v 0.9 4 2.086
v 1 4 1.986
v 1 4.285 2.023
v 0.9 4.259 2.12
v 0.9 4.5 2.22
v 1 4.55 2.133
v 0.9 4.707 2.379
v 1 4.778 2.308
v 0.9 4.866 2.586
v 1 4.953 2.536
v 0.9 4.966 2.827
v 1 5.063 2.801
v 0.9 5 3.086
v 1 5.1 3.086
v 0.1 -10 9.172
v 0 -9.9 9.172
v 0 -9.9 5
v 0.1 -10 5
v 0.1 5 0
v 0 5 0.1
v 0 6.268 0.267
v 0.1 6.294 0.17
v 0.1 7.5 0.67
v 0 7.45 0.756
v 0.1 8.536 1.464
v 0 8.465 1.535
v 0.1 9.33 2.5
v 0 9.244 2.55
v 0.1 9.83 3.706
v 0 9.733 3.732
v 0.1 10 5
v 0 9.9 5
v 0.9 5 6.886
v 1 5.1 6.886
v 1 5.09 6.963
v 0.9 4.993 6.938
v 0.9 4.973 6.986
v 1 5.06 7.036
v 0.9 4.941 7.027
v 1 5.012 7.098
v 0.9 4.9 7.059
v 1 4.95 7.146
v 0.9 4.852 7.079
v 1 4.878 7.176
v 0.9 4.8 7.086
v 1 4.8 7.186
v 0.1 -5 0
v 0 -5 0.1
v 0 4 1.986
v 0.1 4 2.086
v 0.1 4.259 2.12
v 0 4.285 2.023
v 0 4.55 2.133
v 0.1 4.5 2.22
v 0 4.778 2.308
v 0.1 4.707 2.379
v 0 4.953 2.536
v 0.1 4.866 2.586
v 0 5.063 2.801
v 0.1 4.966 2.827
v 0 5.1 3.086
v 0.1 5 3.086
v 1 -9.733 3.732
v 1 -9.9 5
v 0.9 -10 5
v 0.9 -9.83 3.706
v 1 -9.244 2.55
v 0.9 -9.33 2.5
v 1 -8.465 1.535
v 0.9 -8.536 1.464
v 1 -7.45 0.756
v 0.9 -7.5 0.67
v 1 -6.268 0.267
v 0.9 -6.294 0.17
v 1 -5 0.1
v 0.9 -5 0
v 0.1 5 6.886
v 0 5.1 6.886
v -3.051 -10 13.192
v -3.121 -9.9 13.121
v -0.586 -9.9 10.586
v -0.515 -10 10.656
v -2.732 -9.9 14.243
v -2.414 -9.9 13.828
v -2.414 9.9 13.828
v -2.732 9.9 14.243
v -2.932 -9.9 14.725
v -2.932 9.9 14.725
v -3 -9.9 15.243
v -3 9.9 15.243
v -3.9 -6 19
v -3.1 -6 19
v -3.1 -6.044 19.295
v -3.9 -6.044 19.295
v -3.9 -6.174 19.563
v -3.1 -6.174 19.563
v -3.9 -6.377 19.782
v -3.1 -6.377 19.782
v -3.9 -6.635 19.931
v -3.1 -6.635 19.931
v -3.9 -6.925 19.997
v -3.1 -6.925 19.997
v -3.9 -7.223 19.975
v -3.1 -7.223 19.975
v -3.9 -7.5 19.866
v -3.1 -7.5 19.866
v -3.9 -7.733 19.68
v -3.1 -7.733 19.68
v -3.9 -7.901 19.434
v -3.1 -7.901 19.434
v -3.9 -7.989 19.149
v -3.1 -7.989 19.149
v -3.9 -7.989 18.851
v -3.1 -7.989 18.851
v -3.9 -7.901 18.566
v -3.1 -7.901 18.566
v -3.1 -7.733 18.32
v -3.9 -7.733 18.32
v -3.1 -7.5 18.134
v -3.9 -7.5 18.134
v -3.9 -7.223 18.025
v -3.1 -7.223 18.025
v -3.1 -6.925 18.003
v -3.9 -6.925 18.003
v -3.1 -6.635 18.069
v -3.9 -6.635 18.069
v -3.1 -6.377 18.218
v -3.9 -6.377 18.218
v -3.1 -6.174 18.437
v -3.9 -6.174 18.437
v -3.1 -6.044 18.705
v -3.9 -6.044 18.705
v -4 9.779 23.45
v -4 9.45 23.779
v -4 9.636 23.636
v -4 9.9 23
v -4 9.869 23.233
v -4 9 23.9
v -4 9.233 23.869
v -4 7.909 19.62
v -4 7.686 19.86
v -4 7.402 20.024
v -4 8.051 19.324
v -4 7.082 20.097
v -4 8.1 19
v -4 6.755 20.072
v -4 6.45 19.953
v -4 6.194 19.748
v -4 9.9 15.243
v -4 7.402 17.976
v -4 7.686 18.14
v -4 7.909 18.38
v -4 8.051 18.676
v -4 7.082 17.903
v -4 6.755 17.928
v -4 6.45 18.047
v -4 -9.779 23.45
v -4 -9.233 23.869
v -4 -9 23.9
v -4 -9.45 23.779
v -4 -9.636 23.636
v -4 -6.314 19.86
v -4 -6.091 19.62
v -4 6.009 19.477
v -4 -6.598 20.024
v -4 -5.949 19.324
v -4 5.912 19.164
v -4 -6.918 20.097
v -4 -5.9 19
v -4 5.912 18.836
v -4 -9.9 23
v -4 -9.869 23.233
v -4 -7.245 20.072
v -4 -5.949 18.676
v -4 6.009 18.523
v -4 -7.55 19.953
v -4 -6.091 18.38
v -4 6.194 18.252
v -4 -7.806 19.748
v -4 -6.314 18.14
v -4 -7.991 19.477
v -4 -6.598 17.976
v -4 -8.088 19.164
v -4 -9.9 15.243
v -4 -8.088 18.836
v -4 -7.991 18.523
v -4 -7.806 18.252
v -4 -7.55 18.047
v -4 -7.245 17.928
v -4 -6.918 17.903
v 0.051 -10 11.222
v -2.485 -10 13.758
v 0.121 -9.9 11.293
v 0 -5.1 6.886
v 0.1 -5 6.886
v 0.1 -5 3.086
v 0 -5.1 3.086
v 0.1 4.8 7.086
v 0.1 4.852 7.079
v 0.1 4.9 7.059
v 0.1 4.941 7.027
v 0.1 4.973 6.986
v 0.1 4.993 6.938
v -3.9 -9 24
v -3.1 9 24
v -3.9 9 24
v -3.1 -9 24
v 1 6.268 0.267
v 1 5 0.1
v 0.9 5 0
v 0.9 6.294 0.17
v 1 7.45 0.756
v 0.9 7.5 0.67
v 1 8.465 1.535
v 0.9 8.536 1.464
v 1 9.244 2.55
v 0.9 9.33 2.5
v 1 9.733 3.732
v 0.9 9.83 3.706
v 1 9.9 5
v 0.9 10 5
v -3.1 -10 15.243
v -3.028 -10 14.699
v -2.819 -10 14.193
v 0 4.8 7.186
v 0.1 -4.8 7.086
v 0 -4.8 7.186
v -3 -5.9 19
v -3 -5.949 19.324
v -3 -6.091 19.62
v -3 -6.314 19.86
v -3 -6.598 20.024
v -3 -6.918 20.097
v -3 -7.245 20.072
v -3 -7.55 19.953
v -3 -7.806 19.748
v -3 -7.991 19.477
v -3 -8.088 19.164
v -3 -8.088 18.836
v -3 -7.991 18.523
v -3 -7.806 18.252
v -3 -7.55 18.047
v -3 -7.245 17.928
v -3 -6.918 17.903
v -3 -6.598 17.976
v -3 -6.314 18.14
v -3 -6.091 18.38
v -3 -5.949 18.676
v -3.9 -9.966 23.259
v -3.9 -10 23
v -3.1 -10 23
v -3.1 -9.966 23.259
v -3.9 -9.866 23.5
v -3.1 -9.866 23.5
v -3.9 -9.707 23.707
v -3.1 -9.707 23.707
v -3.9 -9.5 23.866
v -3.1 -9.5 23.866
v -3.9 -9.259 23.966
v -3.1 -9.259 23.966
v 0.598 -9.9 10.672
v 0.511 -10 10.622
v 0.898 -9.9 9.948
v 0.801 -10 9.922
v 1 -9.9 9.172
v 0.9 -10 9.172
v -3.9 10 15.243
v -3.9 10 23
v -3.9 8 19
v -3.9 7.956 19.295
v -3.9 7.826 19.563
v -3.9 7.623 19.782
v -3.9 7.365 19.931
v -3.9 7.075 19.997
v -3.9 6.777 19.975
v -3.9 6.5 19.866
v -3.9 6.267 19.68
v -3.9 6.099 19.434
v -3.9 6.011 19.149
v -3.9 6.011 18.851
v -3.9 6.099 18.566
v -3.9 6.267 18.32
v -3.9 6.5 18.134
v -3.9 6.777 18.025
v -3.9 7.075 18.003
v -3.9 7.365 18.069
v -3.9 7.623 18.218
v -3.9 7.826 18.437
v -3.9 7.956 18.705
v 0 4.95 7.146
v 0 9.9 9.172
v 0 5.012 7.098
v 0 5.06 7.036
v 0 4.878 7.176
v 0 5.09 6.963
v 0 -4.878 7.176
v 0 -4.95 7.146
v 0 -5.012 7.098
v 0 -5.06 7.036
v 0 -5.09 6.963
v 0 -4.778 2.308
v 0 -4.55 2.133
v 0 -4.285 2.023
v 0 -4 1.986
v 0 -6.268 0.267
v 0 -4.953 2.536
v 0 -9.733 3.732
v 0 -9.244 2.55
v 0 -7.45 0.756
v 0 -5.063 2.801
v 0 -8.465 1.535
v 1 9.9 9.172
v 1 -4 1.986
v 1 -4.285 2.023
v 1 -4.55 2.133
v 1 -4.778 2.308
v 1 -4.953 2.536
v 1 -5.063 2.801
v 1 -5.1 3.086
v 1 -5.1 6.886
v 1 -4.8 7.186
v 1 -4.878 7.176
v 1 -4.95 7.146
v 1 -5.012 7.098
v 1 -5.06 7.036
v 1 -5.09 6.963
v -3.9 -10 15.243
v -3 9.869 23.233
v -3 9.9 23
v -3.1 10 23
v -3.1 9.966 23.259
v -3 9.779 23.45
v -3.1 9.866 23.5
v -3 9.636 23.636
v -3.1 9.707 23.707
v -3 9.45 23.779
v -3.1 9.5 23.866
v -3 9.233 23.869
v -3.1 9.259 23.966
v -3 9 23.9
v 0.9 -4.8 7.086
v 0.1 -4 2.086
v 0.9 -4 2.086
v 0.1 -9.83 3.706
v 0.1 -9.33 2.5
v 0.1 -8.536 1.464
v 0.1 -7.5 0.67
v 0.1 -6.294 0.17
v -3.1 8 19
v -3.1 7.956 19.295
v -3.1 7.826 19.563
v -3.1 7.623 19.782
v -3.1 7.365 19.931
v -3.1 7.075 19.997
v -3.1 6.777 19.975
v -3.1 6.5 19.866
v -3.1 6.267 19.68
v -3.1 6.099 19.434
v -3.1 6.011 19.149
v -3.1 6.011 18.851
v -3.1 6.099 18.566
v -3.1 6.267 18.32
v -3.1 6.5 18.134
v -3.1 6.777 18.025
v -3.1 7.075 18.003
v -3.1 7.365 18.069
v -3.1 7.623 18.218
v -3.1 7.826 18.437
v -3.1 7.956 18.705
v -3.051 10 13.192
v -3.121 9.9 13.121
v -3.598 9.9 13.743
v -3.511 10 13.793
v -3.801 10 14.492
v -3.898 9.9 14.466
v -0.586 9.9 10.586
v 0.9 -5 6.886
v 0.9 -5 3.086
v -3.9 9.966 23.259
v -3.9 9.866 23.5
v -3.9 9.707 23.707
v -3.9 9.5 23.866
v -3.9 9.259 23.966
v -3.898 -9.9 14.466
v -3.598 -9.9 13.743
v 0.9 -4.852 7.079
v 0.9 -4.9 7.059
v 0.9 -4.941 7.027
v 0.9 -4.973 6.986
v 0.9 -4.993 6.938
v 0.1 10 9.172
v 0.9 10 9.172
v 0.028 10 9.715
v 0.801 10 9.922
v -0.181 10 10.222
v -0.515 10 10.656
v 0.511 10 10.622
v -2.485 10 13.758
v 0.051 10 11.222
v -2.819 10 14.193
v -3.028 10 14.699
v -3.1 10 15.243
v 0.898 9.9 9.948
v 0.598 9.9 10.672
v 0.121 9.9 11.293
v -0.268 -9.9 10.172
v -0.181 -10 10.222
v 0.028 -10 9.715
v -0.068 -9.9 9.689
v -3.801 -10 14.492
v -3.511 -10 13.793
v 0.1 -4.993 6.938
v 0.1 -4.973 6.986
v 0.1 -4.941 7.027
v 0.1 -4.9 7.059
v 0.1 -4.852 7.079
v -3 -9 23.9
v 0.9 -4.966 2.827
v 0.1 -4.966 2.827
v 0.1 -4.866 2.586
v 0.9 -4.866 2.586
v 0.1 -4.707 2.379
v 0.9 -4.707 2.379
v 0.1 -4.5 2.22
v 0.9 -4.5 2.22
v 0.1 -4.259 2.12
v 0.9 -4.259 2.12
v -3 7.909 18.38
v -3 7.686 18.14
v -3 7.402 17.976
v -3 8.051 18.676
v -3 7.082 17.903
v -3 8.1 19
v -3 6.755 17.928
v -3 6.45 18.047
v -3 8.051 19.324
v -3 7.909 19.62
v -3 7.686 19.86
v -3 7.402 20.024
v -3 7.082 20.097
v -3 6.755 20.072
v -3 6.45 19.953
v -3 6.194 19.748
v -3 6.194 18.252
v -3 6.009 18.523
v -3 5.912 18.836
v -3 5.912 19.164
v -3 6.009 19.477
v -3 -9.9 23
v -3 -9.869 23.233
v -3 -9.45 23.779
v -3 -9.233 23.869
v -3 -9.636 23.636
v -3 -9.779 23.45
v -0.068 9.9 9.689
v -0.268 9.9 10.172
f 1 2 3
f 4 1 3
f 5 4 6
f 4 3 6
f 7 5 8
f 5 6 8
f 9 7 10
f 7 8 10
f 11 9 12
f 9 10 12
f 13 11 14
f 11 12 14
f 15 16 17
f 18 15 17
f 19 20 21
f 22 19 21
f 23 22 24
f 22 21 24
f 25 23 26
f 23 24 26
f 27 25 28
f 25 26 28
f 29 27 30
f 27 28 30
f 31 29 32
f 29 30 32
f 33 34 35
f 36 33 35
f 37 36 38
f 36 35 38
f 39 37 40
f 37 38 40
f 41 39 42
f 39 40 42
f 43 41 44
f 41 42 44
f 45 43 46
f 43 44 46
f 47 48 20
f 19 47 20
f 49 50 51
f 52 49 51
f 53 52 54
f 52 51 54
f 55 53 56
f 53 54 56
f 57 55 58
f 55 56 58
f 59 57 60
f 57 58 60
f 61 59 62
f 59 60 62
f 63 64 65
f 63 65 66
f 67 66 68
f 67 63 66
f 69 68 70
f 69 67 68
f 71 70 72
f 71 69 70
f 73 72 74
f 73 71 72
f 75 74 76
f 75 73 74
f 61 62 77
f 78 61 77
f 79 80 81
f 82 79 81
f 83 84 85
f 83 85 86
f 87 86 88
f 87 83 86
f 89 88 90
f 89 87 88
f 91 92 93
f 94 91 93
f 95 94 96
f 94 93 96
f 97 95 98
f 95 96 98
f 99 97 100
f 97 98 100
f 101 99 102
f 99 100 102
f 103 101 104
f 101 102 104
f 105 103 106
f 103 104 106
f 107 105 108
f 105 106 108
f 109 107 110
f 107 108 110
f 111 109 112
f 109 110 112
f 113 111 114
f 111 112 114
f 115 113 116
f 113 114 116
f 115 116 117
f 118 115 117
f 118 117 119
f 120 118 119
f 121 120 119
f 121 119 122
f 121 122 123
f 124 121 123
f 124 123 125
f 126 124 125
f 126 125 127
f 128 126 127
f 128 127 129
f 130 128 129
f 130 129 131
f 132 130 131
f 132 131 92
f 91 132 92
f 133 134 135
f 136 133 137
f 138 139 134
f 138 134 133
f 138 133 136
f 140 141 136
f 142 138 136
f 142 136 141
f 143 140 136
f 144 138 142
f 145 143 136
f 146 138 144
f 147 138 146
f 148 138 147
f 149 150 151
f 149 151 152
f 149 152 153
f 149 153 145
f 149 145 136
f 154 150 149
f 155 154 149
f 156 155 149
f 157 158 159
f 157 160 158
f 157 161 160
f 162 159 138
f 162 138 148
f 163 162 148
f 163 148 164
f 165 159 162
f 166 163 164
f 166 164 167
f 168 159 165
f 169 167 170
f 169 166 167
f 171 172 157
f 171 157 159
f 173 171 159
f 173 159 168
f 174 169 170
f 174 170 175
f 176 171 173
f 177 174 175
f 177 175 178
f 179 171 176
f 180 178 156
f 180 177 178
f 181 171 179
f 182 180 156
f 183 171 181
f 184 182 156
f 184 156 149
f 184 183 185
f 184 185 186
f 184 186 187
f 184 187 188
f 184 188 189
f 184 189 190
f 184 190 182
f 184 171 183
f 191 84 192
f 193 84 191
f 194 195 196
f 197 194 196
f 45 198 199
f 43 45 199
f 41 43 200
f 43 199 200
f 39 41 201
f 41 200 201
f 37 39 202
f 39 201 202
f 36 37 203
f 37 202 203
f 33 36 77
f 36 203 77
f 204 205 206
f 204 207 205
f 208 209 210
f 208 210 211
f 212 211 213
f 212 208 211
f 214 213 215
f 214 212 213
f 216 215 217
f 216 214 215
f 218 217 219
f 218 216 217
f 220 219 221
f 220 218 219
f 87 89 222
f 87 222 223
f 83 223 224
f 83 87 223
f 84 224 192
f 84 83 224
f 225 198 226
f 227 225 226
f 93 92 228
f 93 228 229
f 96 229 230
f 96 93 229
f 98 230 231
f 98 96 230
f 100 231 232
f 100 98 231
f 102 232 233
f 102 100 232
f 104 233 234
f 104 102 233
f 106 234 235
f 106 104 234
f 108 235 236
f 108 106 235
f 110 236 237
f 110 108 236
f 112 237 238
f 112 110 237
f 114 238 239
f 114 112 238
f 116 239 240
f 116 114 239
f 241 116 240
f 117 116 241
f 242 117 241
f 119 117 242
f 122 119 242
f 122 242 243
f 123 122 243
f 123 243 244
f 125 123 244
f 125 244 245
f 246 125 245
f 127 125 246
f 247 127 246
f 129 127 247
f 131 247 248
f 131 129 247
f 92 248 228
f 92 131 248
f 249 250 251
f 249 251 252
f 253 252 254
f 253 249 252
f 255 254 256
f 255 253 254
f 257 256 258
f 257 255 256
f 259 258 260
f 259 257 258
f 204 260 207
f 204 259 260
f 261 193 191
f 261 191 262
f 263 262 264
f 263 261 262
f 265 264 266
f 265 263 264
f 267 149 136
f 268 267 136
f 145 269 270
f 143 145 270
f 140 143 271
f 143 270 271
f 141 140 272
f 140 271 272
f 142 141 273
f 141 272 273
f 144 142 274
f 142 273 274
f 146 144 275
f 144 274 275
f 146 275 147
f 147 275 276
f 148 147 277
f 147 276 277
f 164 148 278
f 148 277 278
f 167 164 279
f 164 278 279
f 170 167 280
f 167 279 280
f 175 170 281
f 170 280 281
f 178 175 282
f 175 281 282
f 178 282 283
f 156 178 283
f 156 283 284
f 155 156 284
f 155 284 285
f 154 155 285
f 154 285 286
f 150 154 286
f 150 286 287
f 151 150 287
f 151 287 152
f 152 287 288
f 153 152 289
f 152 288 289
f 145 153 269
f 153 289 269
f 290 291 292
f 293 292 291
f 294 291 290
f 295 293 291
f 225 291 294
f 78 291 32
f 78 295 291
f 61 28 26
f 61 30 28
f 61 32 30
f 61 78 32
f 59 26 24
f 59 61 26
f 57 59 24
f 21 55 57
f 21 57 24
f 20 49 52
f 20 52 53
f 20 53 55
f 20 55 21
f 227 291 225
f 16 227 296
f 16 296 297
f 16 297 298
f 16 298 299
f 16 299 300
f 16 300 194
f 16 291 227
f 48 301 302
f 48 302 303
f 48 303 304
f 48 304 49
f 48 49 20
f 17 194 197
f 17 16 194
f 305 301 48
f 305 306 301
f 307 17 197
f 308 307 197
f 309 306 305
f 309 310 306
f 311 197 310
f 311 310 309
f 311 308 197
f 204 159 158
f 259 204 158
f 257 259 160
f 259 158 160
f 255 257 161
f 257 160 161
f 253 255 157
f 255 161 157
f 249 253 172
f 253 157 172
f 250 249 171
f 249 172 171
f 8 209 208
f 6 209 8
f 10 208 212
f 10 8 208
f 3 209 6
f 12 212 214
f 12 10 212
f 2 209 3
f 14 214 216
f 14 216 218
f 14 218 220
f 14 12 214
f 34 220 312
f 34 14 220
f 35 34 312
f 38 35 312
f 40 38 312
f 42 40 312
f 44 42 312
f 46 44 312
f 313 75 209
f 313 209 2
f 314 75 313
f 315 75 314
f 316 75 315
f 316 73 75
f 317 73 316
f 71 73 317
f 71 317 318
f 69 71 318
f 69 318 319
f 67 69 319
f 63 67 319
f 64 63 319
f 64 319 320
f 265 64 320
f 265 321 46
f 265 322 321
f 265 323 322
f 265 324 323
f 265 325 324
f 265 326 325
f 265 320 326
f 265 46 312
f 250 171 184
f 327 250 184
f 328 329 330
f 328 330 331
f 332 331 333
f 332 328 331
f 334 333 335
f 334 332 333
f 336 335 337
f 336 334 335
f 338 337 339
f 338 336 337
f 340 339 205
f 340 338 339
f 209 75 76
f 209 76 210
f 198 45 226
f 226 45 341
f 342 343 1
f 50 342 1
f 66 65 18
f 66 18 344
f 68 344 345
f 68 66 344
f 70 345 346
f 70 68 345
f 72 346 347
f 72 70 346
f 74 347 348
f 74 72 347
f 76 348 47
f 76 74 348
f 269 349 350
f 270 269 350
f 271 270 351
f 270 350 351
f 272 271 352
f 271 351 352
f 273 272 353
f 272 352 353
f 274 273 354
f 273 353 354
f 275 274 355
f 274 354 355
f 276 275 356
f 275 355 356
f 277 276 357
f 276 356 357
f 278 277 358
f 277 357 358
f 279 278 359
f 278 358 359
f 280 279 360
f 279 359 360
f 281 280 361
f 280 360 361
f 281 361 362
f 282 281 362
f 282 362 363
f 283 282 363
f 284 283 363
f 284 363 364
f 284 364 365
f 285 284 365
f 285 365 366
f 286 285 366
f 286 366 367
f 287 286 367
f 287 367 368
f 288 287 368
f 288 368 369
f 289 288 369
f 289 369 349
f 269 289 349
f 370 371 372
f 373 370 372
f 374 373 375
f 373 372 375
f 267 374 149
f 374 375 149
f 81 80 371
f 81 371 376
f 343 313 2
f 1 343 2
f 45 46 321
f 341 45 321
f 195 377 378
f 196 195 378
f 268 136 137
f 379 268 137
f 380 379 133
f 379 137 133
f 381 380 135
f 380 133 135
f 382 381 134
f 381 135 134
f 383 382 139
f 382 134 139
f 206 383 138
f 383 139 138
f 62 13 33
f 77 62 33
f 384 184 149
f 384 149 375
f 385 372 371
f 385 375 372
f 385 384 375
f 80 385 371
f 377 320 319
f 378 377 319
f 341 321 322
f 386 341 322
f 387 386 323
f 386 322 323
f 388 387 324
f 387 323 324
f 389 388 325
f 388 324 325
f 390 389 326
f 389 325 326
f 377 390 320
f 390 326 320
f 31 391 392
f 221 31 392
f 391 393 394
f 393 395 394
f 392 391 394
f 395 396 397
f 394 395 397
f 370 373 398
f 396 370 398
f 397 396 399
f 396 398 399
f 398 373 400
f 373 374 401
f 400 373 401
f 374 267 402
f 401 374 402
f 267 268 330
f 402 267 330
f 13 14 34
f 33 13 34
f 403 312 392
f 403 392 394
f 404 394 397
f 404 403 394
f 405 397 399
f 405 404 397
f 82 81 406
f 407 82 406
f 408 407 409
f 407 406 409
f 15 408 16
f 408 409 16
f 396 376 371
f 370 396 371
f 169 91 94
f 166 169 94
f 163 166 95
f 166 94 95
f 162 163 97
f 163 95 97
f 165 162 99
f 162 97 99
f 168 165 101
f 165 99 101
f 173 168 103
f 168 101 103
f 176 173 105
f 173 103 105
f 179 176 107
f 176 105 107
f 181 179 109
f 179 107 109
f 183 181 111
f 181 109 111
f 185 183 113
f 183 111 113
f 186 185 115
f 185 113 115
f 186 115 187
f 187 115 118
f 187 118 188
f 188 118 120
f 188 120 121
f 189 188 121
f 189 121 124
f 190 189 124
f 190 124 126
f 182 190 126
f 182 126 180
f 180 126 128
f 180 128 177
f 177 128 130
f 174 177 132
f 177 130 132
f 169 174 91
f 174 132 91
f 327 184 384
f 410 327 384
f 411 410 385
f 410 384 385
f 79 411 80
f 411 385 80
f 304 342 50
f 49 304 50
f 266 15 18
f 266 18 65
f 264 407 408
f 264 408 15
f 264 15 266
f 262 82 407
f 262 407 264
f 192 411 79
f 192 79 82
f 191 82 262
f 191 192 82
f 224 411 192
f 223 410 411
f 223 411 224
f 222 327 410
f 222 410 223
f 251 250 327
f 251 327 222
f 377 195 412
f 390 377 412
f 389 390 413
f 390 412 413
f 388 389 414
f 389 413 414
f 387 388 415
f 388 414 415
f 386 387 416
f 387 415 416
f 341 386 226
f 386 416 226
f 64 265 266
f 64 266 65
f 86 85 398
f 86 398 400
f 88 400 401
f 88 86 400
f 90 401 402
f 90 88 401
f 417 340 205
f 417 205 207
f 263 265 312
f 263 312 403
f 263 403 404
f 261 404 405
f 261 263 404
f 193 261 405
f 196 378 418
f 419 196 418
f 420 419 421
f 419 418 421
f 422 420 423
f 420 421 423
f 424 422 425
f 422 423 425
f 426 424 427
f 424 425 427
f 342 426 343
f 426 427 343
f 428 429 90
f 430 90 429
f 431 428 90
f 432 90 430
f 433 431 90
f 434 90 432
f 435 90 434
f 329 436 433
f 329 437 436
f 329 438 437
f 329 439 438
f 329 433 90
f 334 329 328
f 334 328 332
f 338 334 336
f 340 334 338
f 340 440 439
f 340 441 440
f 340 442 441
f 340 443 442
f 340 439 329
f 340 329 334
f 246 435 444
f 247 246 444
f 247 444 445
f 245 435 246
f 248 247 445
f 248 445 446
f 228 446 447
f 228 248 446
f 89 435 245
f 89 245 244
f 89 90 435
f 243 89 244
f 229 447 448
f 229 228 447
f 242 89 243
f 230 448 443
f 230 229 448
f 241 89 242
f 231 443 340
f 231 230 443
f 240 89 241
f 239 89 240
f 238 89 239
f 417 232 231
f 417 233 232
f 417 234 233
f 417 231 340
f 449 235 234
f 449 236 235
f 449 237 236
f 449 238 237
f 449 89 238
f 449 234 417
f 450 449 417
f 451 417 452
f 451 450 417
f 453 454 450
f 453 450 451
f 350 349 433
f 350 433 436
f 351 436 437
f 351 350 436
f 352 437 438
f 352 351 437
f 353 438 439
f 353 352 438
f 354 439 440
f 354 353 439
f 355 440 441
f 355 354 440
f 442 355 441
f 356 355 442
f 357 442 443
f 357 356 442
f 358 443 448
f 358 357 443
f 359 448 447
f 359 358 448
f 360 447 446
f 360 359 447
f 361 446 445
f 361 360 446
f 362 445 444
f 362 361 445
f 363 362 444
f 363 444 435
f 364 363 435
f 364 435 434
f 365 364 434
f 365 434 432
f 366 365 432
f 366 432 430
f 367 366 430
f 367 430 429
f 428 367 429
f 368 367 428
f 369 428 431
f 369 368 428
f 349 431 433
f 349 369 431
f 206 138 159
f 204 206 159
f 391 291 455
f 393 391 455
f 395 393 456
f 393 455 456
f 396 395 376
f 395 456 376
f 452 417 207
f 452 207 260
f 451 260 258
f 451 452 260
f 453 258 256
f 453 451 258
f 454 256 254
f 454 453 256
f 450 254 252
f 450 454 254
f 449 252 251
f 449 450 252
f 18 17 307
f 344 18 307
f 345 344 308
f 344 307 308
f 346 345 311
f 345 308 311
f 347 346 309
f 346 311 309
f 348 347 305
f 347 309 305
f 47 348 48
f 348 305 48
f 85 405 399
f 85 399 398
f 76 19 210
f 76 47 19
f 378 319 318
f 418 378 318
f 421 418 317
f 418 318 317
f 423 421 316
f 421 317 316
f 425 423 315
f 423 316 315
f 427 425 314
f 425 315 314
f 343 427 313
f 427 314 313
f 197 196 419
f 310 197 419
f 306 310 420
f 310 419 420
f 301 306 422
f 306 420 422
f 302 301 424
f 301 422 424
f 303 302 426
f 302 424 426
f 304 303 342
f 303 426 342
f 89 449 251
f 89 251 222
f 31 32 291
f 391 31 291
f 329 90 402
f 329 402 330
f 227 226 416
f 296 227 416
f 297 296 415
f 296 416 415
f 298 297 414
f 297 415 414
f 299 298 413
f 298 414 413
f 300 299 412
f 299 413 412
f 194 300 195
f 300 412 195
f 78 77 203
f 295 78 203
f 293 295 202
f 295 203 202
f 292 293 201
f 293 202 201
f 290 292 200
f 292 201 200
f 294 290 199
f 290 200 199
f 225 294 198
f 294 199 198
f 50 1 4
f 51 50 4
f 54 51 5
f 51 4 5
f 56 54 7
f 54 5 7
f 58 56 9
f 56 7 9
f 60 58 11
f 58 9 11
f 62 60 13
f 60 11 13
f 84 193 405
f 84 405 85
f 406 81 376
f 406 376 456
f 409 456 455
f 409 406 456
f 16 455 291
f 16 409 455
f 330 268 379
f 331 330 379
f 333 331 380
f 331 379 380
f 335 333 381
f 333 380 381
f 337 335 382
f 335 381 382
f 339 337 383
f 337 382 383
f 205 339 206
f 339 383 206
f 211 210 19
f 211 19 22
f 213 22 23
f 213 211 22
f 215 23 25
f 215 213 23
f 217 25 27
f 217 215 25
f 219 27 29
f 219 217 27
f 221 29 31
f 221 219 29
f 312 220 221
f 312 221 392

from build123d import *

# Parameters (mm, degrees)
F1_DEPTH = 10
F2_R     = 5
F3_R     = 1
F4_DEPTH = 25
F5_R     = 1
F7_DEPTH = 1
F8_R     = 0.2
F9_SIZE  = 0.1


with BuildPart() as f1:
    # F0 (on Front) → F1 (new body, symmetric)
    with BuildSketch(Plane.XZ):
        with BuildLine():
            Line((0, 9.1715728753), (0, 0))
            Line((0, 0), (1, 0))
            Line((1, 0), (1, 9.1715728753))
            ThreePointArc((1, 9.1715728753), (0.7716385975, 10.3196231723), (0.1213203436, 11.2928932188))
            Line((0.1213203436, 11.2928932188), (-2.4142135624, 13.8284271247))
            ThreePointArc((-2.4142135624, 13.8284271247), (-2.847759065, 14.4772738224), (-3, 15.2426406871))
            Line((-3, 15.2426406871), (-3, 24))
            Line((-3, 24), (-4, 24))
            Line((-4, 24), (-4, 15.2426406871))
            ThreePointArc((-4, 15.2426406871), (-3.7716385975, 14.09459039), (-3.1213203436, 13.1213203436))
            Line((-3.1213203436, 13.1213203436), (-0.5857864376, 10.5857864376))
            ThreePointArc((-0.5857864376, 10.5857864376), (-0.152240935, 9.93693974), (0, 9.1715728753))
        make_face()
    extrude(amount=F1_DEPTH, both=True)

    # F2
    f2_edges = [f1.edges().sort_by_distance(p)[0] for p in [
        (0.5, -10, 0),
        (0.5, 10, 0),
    ]]
    fillet(f2_edges, radius=F2_R)

    # F3 (on face) → F4 (cut)
    with BuildSketch(Plane.YZ.offset(-3)):
        with Locations((-7, 19)):
            Circle(F3_R)
        with Locations((7, 19)):
            Circle(F3_R)
    extrude(amount=-F4_DEPTH, mode=Mode.SUBTRACT)

    # F5
    f5_edges = [f1.edges().sort_by_distance(p)[0] for p in [
        (-3.5, -10, 24),
        (-3.5, 10, 24),
    ]]
    fillet(f5_edges, radius=F5_R)

    # F6 (on face) → F7 (cut, through all)
    with BuildSketch(Plane.YZ.offset(1)):
        with BuildLine():
            Line((-4, 2.0857864376), (4, 2.0857864376))
            ThreePointArc((4, 2.0857864376), (4.7071067812, 2.3786796564), (5, 3.0857864376))
            Line((5, 3.0857864376), (5, 7.0857864376))
            Line((5, 7.0857864376), (-5, 7.0857864376))
            Line((-5, 7.0857864376), (-5, 3.0857864376))
            ThreePointArc((-5, 3.0857864376), (-4.7071067812, 2.3786796564), (-4, 2.0857864376))
        make_face()
    extrude(amount=-F7_DEPTH, mode=Mode.SUBTRACT)

    # F8
    f8_edges = [f1.edges().sort_by_distance(p)[0] for p in [
        (0.5, 5, 7.085786),
        (0.5, -5, 7.085786),
    ]]
    fillet(f8_edges, radius=F8_R)

    # F9
    f9_edges = [f1.edges().sort_by_distance(p)[0] for p in [
        (1, 8.535534, 1.464466),
        (1, 0, 7.085786),
        (-3, 6, 19),
        (-3, -8, 19),
        (-4, -8, 19),
        (-4, 6, 19),
        (-3.771639, -10, 14.09459),
        (0, -5, 4.985786),
    ]]
    chamfer(f9_edges, length=F9_SIZE)


solid = f1.part
